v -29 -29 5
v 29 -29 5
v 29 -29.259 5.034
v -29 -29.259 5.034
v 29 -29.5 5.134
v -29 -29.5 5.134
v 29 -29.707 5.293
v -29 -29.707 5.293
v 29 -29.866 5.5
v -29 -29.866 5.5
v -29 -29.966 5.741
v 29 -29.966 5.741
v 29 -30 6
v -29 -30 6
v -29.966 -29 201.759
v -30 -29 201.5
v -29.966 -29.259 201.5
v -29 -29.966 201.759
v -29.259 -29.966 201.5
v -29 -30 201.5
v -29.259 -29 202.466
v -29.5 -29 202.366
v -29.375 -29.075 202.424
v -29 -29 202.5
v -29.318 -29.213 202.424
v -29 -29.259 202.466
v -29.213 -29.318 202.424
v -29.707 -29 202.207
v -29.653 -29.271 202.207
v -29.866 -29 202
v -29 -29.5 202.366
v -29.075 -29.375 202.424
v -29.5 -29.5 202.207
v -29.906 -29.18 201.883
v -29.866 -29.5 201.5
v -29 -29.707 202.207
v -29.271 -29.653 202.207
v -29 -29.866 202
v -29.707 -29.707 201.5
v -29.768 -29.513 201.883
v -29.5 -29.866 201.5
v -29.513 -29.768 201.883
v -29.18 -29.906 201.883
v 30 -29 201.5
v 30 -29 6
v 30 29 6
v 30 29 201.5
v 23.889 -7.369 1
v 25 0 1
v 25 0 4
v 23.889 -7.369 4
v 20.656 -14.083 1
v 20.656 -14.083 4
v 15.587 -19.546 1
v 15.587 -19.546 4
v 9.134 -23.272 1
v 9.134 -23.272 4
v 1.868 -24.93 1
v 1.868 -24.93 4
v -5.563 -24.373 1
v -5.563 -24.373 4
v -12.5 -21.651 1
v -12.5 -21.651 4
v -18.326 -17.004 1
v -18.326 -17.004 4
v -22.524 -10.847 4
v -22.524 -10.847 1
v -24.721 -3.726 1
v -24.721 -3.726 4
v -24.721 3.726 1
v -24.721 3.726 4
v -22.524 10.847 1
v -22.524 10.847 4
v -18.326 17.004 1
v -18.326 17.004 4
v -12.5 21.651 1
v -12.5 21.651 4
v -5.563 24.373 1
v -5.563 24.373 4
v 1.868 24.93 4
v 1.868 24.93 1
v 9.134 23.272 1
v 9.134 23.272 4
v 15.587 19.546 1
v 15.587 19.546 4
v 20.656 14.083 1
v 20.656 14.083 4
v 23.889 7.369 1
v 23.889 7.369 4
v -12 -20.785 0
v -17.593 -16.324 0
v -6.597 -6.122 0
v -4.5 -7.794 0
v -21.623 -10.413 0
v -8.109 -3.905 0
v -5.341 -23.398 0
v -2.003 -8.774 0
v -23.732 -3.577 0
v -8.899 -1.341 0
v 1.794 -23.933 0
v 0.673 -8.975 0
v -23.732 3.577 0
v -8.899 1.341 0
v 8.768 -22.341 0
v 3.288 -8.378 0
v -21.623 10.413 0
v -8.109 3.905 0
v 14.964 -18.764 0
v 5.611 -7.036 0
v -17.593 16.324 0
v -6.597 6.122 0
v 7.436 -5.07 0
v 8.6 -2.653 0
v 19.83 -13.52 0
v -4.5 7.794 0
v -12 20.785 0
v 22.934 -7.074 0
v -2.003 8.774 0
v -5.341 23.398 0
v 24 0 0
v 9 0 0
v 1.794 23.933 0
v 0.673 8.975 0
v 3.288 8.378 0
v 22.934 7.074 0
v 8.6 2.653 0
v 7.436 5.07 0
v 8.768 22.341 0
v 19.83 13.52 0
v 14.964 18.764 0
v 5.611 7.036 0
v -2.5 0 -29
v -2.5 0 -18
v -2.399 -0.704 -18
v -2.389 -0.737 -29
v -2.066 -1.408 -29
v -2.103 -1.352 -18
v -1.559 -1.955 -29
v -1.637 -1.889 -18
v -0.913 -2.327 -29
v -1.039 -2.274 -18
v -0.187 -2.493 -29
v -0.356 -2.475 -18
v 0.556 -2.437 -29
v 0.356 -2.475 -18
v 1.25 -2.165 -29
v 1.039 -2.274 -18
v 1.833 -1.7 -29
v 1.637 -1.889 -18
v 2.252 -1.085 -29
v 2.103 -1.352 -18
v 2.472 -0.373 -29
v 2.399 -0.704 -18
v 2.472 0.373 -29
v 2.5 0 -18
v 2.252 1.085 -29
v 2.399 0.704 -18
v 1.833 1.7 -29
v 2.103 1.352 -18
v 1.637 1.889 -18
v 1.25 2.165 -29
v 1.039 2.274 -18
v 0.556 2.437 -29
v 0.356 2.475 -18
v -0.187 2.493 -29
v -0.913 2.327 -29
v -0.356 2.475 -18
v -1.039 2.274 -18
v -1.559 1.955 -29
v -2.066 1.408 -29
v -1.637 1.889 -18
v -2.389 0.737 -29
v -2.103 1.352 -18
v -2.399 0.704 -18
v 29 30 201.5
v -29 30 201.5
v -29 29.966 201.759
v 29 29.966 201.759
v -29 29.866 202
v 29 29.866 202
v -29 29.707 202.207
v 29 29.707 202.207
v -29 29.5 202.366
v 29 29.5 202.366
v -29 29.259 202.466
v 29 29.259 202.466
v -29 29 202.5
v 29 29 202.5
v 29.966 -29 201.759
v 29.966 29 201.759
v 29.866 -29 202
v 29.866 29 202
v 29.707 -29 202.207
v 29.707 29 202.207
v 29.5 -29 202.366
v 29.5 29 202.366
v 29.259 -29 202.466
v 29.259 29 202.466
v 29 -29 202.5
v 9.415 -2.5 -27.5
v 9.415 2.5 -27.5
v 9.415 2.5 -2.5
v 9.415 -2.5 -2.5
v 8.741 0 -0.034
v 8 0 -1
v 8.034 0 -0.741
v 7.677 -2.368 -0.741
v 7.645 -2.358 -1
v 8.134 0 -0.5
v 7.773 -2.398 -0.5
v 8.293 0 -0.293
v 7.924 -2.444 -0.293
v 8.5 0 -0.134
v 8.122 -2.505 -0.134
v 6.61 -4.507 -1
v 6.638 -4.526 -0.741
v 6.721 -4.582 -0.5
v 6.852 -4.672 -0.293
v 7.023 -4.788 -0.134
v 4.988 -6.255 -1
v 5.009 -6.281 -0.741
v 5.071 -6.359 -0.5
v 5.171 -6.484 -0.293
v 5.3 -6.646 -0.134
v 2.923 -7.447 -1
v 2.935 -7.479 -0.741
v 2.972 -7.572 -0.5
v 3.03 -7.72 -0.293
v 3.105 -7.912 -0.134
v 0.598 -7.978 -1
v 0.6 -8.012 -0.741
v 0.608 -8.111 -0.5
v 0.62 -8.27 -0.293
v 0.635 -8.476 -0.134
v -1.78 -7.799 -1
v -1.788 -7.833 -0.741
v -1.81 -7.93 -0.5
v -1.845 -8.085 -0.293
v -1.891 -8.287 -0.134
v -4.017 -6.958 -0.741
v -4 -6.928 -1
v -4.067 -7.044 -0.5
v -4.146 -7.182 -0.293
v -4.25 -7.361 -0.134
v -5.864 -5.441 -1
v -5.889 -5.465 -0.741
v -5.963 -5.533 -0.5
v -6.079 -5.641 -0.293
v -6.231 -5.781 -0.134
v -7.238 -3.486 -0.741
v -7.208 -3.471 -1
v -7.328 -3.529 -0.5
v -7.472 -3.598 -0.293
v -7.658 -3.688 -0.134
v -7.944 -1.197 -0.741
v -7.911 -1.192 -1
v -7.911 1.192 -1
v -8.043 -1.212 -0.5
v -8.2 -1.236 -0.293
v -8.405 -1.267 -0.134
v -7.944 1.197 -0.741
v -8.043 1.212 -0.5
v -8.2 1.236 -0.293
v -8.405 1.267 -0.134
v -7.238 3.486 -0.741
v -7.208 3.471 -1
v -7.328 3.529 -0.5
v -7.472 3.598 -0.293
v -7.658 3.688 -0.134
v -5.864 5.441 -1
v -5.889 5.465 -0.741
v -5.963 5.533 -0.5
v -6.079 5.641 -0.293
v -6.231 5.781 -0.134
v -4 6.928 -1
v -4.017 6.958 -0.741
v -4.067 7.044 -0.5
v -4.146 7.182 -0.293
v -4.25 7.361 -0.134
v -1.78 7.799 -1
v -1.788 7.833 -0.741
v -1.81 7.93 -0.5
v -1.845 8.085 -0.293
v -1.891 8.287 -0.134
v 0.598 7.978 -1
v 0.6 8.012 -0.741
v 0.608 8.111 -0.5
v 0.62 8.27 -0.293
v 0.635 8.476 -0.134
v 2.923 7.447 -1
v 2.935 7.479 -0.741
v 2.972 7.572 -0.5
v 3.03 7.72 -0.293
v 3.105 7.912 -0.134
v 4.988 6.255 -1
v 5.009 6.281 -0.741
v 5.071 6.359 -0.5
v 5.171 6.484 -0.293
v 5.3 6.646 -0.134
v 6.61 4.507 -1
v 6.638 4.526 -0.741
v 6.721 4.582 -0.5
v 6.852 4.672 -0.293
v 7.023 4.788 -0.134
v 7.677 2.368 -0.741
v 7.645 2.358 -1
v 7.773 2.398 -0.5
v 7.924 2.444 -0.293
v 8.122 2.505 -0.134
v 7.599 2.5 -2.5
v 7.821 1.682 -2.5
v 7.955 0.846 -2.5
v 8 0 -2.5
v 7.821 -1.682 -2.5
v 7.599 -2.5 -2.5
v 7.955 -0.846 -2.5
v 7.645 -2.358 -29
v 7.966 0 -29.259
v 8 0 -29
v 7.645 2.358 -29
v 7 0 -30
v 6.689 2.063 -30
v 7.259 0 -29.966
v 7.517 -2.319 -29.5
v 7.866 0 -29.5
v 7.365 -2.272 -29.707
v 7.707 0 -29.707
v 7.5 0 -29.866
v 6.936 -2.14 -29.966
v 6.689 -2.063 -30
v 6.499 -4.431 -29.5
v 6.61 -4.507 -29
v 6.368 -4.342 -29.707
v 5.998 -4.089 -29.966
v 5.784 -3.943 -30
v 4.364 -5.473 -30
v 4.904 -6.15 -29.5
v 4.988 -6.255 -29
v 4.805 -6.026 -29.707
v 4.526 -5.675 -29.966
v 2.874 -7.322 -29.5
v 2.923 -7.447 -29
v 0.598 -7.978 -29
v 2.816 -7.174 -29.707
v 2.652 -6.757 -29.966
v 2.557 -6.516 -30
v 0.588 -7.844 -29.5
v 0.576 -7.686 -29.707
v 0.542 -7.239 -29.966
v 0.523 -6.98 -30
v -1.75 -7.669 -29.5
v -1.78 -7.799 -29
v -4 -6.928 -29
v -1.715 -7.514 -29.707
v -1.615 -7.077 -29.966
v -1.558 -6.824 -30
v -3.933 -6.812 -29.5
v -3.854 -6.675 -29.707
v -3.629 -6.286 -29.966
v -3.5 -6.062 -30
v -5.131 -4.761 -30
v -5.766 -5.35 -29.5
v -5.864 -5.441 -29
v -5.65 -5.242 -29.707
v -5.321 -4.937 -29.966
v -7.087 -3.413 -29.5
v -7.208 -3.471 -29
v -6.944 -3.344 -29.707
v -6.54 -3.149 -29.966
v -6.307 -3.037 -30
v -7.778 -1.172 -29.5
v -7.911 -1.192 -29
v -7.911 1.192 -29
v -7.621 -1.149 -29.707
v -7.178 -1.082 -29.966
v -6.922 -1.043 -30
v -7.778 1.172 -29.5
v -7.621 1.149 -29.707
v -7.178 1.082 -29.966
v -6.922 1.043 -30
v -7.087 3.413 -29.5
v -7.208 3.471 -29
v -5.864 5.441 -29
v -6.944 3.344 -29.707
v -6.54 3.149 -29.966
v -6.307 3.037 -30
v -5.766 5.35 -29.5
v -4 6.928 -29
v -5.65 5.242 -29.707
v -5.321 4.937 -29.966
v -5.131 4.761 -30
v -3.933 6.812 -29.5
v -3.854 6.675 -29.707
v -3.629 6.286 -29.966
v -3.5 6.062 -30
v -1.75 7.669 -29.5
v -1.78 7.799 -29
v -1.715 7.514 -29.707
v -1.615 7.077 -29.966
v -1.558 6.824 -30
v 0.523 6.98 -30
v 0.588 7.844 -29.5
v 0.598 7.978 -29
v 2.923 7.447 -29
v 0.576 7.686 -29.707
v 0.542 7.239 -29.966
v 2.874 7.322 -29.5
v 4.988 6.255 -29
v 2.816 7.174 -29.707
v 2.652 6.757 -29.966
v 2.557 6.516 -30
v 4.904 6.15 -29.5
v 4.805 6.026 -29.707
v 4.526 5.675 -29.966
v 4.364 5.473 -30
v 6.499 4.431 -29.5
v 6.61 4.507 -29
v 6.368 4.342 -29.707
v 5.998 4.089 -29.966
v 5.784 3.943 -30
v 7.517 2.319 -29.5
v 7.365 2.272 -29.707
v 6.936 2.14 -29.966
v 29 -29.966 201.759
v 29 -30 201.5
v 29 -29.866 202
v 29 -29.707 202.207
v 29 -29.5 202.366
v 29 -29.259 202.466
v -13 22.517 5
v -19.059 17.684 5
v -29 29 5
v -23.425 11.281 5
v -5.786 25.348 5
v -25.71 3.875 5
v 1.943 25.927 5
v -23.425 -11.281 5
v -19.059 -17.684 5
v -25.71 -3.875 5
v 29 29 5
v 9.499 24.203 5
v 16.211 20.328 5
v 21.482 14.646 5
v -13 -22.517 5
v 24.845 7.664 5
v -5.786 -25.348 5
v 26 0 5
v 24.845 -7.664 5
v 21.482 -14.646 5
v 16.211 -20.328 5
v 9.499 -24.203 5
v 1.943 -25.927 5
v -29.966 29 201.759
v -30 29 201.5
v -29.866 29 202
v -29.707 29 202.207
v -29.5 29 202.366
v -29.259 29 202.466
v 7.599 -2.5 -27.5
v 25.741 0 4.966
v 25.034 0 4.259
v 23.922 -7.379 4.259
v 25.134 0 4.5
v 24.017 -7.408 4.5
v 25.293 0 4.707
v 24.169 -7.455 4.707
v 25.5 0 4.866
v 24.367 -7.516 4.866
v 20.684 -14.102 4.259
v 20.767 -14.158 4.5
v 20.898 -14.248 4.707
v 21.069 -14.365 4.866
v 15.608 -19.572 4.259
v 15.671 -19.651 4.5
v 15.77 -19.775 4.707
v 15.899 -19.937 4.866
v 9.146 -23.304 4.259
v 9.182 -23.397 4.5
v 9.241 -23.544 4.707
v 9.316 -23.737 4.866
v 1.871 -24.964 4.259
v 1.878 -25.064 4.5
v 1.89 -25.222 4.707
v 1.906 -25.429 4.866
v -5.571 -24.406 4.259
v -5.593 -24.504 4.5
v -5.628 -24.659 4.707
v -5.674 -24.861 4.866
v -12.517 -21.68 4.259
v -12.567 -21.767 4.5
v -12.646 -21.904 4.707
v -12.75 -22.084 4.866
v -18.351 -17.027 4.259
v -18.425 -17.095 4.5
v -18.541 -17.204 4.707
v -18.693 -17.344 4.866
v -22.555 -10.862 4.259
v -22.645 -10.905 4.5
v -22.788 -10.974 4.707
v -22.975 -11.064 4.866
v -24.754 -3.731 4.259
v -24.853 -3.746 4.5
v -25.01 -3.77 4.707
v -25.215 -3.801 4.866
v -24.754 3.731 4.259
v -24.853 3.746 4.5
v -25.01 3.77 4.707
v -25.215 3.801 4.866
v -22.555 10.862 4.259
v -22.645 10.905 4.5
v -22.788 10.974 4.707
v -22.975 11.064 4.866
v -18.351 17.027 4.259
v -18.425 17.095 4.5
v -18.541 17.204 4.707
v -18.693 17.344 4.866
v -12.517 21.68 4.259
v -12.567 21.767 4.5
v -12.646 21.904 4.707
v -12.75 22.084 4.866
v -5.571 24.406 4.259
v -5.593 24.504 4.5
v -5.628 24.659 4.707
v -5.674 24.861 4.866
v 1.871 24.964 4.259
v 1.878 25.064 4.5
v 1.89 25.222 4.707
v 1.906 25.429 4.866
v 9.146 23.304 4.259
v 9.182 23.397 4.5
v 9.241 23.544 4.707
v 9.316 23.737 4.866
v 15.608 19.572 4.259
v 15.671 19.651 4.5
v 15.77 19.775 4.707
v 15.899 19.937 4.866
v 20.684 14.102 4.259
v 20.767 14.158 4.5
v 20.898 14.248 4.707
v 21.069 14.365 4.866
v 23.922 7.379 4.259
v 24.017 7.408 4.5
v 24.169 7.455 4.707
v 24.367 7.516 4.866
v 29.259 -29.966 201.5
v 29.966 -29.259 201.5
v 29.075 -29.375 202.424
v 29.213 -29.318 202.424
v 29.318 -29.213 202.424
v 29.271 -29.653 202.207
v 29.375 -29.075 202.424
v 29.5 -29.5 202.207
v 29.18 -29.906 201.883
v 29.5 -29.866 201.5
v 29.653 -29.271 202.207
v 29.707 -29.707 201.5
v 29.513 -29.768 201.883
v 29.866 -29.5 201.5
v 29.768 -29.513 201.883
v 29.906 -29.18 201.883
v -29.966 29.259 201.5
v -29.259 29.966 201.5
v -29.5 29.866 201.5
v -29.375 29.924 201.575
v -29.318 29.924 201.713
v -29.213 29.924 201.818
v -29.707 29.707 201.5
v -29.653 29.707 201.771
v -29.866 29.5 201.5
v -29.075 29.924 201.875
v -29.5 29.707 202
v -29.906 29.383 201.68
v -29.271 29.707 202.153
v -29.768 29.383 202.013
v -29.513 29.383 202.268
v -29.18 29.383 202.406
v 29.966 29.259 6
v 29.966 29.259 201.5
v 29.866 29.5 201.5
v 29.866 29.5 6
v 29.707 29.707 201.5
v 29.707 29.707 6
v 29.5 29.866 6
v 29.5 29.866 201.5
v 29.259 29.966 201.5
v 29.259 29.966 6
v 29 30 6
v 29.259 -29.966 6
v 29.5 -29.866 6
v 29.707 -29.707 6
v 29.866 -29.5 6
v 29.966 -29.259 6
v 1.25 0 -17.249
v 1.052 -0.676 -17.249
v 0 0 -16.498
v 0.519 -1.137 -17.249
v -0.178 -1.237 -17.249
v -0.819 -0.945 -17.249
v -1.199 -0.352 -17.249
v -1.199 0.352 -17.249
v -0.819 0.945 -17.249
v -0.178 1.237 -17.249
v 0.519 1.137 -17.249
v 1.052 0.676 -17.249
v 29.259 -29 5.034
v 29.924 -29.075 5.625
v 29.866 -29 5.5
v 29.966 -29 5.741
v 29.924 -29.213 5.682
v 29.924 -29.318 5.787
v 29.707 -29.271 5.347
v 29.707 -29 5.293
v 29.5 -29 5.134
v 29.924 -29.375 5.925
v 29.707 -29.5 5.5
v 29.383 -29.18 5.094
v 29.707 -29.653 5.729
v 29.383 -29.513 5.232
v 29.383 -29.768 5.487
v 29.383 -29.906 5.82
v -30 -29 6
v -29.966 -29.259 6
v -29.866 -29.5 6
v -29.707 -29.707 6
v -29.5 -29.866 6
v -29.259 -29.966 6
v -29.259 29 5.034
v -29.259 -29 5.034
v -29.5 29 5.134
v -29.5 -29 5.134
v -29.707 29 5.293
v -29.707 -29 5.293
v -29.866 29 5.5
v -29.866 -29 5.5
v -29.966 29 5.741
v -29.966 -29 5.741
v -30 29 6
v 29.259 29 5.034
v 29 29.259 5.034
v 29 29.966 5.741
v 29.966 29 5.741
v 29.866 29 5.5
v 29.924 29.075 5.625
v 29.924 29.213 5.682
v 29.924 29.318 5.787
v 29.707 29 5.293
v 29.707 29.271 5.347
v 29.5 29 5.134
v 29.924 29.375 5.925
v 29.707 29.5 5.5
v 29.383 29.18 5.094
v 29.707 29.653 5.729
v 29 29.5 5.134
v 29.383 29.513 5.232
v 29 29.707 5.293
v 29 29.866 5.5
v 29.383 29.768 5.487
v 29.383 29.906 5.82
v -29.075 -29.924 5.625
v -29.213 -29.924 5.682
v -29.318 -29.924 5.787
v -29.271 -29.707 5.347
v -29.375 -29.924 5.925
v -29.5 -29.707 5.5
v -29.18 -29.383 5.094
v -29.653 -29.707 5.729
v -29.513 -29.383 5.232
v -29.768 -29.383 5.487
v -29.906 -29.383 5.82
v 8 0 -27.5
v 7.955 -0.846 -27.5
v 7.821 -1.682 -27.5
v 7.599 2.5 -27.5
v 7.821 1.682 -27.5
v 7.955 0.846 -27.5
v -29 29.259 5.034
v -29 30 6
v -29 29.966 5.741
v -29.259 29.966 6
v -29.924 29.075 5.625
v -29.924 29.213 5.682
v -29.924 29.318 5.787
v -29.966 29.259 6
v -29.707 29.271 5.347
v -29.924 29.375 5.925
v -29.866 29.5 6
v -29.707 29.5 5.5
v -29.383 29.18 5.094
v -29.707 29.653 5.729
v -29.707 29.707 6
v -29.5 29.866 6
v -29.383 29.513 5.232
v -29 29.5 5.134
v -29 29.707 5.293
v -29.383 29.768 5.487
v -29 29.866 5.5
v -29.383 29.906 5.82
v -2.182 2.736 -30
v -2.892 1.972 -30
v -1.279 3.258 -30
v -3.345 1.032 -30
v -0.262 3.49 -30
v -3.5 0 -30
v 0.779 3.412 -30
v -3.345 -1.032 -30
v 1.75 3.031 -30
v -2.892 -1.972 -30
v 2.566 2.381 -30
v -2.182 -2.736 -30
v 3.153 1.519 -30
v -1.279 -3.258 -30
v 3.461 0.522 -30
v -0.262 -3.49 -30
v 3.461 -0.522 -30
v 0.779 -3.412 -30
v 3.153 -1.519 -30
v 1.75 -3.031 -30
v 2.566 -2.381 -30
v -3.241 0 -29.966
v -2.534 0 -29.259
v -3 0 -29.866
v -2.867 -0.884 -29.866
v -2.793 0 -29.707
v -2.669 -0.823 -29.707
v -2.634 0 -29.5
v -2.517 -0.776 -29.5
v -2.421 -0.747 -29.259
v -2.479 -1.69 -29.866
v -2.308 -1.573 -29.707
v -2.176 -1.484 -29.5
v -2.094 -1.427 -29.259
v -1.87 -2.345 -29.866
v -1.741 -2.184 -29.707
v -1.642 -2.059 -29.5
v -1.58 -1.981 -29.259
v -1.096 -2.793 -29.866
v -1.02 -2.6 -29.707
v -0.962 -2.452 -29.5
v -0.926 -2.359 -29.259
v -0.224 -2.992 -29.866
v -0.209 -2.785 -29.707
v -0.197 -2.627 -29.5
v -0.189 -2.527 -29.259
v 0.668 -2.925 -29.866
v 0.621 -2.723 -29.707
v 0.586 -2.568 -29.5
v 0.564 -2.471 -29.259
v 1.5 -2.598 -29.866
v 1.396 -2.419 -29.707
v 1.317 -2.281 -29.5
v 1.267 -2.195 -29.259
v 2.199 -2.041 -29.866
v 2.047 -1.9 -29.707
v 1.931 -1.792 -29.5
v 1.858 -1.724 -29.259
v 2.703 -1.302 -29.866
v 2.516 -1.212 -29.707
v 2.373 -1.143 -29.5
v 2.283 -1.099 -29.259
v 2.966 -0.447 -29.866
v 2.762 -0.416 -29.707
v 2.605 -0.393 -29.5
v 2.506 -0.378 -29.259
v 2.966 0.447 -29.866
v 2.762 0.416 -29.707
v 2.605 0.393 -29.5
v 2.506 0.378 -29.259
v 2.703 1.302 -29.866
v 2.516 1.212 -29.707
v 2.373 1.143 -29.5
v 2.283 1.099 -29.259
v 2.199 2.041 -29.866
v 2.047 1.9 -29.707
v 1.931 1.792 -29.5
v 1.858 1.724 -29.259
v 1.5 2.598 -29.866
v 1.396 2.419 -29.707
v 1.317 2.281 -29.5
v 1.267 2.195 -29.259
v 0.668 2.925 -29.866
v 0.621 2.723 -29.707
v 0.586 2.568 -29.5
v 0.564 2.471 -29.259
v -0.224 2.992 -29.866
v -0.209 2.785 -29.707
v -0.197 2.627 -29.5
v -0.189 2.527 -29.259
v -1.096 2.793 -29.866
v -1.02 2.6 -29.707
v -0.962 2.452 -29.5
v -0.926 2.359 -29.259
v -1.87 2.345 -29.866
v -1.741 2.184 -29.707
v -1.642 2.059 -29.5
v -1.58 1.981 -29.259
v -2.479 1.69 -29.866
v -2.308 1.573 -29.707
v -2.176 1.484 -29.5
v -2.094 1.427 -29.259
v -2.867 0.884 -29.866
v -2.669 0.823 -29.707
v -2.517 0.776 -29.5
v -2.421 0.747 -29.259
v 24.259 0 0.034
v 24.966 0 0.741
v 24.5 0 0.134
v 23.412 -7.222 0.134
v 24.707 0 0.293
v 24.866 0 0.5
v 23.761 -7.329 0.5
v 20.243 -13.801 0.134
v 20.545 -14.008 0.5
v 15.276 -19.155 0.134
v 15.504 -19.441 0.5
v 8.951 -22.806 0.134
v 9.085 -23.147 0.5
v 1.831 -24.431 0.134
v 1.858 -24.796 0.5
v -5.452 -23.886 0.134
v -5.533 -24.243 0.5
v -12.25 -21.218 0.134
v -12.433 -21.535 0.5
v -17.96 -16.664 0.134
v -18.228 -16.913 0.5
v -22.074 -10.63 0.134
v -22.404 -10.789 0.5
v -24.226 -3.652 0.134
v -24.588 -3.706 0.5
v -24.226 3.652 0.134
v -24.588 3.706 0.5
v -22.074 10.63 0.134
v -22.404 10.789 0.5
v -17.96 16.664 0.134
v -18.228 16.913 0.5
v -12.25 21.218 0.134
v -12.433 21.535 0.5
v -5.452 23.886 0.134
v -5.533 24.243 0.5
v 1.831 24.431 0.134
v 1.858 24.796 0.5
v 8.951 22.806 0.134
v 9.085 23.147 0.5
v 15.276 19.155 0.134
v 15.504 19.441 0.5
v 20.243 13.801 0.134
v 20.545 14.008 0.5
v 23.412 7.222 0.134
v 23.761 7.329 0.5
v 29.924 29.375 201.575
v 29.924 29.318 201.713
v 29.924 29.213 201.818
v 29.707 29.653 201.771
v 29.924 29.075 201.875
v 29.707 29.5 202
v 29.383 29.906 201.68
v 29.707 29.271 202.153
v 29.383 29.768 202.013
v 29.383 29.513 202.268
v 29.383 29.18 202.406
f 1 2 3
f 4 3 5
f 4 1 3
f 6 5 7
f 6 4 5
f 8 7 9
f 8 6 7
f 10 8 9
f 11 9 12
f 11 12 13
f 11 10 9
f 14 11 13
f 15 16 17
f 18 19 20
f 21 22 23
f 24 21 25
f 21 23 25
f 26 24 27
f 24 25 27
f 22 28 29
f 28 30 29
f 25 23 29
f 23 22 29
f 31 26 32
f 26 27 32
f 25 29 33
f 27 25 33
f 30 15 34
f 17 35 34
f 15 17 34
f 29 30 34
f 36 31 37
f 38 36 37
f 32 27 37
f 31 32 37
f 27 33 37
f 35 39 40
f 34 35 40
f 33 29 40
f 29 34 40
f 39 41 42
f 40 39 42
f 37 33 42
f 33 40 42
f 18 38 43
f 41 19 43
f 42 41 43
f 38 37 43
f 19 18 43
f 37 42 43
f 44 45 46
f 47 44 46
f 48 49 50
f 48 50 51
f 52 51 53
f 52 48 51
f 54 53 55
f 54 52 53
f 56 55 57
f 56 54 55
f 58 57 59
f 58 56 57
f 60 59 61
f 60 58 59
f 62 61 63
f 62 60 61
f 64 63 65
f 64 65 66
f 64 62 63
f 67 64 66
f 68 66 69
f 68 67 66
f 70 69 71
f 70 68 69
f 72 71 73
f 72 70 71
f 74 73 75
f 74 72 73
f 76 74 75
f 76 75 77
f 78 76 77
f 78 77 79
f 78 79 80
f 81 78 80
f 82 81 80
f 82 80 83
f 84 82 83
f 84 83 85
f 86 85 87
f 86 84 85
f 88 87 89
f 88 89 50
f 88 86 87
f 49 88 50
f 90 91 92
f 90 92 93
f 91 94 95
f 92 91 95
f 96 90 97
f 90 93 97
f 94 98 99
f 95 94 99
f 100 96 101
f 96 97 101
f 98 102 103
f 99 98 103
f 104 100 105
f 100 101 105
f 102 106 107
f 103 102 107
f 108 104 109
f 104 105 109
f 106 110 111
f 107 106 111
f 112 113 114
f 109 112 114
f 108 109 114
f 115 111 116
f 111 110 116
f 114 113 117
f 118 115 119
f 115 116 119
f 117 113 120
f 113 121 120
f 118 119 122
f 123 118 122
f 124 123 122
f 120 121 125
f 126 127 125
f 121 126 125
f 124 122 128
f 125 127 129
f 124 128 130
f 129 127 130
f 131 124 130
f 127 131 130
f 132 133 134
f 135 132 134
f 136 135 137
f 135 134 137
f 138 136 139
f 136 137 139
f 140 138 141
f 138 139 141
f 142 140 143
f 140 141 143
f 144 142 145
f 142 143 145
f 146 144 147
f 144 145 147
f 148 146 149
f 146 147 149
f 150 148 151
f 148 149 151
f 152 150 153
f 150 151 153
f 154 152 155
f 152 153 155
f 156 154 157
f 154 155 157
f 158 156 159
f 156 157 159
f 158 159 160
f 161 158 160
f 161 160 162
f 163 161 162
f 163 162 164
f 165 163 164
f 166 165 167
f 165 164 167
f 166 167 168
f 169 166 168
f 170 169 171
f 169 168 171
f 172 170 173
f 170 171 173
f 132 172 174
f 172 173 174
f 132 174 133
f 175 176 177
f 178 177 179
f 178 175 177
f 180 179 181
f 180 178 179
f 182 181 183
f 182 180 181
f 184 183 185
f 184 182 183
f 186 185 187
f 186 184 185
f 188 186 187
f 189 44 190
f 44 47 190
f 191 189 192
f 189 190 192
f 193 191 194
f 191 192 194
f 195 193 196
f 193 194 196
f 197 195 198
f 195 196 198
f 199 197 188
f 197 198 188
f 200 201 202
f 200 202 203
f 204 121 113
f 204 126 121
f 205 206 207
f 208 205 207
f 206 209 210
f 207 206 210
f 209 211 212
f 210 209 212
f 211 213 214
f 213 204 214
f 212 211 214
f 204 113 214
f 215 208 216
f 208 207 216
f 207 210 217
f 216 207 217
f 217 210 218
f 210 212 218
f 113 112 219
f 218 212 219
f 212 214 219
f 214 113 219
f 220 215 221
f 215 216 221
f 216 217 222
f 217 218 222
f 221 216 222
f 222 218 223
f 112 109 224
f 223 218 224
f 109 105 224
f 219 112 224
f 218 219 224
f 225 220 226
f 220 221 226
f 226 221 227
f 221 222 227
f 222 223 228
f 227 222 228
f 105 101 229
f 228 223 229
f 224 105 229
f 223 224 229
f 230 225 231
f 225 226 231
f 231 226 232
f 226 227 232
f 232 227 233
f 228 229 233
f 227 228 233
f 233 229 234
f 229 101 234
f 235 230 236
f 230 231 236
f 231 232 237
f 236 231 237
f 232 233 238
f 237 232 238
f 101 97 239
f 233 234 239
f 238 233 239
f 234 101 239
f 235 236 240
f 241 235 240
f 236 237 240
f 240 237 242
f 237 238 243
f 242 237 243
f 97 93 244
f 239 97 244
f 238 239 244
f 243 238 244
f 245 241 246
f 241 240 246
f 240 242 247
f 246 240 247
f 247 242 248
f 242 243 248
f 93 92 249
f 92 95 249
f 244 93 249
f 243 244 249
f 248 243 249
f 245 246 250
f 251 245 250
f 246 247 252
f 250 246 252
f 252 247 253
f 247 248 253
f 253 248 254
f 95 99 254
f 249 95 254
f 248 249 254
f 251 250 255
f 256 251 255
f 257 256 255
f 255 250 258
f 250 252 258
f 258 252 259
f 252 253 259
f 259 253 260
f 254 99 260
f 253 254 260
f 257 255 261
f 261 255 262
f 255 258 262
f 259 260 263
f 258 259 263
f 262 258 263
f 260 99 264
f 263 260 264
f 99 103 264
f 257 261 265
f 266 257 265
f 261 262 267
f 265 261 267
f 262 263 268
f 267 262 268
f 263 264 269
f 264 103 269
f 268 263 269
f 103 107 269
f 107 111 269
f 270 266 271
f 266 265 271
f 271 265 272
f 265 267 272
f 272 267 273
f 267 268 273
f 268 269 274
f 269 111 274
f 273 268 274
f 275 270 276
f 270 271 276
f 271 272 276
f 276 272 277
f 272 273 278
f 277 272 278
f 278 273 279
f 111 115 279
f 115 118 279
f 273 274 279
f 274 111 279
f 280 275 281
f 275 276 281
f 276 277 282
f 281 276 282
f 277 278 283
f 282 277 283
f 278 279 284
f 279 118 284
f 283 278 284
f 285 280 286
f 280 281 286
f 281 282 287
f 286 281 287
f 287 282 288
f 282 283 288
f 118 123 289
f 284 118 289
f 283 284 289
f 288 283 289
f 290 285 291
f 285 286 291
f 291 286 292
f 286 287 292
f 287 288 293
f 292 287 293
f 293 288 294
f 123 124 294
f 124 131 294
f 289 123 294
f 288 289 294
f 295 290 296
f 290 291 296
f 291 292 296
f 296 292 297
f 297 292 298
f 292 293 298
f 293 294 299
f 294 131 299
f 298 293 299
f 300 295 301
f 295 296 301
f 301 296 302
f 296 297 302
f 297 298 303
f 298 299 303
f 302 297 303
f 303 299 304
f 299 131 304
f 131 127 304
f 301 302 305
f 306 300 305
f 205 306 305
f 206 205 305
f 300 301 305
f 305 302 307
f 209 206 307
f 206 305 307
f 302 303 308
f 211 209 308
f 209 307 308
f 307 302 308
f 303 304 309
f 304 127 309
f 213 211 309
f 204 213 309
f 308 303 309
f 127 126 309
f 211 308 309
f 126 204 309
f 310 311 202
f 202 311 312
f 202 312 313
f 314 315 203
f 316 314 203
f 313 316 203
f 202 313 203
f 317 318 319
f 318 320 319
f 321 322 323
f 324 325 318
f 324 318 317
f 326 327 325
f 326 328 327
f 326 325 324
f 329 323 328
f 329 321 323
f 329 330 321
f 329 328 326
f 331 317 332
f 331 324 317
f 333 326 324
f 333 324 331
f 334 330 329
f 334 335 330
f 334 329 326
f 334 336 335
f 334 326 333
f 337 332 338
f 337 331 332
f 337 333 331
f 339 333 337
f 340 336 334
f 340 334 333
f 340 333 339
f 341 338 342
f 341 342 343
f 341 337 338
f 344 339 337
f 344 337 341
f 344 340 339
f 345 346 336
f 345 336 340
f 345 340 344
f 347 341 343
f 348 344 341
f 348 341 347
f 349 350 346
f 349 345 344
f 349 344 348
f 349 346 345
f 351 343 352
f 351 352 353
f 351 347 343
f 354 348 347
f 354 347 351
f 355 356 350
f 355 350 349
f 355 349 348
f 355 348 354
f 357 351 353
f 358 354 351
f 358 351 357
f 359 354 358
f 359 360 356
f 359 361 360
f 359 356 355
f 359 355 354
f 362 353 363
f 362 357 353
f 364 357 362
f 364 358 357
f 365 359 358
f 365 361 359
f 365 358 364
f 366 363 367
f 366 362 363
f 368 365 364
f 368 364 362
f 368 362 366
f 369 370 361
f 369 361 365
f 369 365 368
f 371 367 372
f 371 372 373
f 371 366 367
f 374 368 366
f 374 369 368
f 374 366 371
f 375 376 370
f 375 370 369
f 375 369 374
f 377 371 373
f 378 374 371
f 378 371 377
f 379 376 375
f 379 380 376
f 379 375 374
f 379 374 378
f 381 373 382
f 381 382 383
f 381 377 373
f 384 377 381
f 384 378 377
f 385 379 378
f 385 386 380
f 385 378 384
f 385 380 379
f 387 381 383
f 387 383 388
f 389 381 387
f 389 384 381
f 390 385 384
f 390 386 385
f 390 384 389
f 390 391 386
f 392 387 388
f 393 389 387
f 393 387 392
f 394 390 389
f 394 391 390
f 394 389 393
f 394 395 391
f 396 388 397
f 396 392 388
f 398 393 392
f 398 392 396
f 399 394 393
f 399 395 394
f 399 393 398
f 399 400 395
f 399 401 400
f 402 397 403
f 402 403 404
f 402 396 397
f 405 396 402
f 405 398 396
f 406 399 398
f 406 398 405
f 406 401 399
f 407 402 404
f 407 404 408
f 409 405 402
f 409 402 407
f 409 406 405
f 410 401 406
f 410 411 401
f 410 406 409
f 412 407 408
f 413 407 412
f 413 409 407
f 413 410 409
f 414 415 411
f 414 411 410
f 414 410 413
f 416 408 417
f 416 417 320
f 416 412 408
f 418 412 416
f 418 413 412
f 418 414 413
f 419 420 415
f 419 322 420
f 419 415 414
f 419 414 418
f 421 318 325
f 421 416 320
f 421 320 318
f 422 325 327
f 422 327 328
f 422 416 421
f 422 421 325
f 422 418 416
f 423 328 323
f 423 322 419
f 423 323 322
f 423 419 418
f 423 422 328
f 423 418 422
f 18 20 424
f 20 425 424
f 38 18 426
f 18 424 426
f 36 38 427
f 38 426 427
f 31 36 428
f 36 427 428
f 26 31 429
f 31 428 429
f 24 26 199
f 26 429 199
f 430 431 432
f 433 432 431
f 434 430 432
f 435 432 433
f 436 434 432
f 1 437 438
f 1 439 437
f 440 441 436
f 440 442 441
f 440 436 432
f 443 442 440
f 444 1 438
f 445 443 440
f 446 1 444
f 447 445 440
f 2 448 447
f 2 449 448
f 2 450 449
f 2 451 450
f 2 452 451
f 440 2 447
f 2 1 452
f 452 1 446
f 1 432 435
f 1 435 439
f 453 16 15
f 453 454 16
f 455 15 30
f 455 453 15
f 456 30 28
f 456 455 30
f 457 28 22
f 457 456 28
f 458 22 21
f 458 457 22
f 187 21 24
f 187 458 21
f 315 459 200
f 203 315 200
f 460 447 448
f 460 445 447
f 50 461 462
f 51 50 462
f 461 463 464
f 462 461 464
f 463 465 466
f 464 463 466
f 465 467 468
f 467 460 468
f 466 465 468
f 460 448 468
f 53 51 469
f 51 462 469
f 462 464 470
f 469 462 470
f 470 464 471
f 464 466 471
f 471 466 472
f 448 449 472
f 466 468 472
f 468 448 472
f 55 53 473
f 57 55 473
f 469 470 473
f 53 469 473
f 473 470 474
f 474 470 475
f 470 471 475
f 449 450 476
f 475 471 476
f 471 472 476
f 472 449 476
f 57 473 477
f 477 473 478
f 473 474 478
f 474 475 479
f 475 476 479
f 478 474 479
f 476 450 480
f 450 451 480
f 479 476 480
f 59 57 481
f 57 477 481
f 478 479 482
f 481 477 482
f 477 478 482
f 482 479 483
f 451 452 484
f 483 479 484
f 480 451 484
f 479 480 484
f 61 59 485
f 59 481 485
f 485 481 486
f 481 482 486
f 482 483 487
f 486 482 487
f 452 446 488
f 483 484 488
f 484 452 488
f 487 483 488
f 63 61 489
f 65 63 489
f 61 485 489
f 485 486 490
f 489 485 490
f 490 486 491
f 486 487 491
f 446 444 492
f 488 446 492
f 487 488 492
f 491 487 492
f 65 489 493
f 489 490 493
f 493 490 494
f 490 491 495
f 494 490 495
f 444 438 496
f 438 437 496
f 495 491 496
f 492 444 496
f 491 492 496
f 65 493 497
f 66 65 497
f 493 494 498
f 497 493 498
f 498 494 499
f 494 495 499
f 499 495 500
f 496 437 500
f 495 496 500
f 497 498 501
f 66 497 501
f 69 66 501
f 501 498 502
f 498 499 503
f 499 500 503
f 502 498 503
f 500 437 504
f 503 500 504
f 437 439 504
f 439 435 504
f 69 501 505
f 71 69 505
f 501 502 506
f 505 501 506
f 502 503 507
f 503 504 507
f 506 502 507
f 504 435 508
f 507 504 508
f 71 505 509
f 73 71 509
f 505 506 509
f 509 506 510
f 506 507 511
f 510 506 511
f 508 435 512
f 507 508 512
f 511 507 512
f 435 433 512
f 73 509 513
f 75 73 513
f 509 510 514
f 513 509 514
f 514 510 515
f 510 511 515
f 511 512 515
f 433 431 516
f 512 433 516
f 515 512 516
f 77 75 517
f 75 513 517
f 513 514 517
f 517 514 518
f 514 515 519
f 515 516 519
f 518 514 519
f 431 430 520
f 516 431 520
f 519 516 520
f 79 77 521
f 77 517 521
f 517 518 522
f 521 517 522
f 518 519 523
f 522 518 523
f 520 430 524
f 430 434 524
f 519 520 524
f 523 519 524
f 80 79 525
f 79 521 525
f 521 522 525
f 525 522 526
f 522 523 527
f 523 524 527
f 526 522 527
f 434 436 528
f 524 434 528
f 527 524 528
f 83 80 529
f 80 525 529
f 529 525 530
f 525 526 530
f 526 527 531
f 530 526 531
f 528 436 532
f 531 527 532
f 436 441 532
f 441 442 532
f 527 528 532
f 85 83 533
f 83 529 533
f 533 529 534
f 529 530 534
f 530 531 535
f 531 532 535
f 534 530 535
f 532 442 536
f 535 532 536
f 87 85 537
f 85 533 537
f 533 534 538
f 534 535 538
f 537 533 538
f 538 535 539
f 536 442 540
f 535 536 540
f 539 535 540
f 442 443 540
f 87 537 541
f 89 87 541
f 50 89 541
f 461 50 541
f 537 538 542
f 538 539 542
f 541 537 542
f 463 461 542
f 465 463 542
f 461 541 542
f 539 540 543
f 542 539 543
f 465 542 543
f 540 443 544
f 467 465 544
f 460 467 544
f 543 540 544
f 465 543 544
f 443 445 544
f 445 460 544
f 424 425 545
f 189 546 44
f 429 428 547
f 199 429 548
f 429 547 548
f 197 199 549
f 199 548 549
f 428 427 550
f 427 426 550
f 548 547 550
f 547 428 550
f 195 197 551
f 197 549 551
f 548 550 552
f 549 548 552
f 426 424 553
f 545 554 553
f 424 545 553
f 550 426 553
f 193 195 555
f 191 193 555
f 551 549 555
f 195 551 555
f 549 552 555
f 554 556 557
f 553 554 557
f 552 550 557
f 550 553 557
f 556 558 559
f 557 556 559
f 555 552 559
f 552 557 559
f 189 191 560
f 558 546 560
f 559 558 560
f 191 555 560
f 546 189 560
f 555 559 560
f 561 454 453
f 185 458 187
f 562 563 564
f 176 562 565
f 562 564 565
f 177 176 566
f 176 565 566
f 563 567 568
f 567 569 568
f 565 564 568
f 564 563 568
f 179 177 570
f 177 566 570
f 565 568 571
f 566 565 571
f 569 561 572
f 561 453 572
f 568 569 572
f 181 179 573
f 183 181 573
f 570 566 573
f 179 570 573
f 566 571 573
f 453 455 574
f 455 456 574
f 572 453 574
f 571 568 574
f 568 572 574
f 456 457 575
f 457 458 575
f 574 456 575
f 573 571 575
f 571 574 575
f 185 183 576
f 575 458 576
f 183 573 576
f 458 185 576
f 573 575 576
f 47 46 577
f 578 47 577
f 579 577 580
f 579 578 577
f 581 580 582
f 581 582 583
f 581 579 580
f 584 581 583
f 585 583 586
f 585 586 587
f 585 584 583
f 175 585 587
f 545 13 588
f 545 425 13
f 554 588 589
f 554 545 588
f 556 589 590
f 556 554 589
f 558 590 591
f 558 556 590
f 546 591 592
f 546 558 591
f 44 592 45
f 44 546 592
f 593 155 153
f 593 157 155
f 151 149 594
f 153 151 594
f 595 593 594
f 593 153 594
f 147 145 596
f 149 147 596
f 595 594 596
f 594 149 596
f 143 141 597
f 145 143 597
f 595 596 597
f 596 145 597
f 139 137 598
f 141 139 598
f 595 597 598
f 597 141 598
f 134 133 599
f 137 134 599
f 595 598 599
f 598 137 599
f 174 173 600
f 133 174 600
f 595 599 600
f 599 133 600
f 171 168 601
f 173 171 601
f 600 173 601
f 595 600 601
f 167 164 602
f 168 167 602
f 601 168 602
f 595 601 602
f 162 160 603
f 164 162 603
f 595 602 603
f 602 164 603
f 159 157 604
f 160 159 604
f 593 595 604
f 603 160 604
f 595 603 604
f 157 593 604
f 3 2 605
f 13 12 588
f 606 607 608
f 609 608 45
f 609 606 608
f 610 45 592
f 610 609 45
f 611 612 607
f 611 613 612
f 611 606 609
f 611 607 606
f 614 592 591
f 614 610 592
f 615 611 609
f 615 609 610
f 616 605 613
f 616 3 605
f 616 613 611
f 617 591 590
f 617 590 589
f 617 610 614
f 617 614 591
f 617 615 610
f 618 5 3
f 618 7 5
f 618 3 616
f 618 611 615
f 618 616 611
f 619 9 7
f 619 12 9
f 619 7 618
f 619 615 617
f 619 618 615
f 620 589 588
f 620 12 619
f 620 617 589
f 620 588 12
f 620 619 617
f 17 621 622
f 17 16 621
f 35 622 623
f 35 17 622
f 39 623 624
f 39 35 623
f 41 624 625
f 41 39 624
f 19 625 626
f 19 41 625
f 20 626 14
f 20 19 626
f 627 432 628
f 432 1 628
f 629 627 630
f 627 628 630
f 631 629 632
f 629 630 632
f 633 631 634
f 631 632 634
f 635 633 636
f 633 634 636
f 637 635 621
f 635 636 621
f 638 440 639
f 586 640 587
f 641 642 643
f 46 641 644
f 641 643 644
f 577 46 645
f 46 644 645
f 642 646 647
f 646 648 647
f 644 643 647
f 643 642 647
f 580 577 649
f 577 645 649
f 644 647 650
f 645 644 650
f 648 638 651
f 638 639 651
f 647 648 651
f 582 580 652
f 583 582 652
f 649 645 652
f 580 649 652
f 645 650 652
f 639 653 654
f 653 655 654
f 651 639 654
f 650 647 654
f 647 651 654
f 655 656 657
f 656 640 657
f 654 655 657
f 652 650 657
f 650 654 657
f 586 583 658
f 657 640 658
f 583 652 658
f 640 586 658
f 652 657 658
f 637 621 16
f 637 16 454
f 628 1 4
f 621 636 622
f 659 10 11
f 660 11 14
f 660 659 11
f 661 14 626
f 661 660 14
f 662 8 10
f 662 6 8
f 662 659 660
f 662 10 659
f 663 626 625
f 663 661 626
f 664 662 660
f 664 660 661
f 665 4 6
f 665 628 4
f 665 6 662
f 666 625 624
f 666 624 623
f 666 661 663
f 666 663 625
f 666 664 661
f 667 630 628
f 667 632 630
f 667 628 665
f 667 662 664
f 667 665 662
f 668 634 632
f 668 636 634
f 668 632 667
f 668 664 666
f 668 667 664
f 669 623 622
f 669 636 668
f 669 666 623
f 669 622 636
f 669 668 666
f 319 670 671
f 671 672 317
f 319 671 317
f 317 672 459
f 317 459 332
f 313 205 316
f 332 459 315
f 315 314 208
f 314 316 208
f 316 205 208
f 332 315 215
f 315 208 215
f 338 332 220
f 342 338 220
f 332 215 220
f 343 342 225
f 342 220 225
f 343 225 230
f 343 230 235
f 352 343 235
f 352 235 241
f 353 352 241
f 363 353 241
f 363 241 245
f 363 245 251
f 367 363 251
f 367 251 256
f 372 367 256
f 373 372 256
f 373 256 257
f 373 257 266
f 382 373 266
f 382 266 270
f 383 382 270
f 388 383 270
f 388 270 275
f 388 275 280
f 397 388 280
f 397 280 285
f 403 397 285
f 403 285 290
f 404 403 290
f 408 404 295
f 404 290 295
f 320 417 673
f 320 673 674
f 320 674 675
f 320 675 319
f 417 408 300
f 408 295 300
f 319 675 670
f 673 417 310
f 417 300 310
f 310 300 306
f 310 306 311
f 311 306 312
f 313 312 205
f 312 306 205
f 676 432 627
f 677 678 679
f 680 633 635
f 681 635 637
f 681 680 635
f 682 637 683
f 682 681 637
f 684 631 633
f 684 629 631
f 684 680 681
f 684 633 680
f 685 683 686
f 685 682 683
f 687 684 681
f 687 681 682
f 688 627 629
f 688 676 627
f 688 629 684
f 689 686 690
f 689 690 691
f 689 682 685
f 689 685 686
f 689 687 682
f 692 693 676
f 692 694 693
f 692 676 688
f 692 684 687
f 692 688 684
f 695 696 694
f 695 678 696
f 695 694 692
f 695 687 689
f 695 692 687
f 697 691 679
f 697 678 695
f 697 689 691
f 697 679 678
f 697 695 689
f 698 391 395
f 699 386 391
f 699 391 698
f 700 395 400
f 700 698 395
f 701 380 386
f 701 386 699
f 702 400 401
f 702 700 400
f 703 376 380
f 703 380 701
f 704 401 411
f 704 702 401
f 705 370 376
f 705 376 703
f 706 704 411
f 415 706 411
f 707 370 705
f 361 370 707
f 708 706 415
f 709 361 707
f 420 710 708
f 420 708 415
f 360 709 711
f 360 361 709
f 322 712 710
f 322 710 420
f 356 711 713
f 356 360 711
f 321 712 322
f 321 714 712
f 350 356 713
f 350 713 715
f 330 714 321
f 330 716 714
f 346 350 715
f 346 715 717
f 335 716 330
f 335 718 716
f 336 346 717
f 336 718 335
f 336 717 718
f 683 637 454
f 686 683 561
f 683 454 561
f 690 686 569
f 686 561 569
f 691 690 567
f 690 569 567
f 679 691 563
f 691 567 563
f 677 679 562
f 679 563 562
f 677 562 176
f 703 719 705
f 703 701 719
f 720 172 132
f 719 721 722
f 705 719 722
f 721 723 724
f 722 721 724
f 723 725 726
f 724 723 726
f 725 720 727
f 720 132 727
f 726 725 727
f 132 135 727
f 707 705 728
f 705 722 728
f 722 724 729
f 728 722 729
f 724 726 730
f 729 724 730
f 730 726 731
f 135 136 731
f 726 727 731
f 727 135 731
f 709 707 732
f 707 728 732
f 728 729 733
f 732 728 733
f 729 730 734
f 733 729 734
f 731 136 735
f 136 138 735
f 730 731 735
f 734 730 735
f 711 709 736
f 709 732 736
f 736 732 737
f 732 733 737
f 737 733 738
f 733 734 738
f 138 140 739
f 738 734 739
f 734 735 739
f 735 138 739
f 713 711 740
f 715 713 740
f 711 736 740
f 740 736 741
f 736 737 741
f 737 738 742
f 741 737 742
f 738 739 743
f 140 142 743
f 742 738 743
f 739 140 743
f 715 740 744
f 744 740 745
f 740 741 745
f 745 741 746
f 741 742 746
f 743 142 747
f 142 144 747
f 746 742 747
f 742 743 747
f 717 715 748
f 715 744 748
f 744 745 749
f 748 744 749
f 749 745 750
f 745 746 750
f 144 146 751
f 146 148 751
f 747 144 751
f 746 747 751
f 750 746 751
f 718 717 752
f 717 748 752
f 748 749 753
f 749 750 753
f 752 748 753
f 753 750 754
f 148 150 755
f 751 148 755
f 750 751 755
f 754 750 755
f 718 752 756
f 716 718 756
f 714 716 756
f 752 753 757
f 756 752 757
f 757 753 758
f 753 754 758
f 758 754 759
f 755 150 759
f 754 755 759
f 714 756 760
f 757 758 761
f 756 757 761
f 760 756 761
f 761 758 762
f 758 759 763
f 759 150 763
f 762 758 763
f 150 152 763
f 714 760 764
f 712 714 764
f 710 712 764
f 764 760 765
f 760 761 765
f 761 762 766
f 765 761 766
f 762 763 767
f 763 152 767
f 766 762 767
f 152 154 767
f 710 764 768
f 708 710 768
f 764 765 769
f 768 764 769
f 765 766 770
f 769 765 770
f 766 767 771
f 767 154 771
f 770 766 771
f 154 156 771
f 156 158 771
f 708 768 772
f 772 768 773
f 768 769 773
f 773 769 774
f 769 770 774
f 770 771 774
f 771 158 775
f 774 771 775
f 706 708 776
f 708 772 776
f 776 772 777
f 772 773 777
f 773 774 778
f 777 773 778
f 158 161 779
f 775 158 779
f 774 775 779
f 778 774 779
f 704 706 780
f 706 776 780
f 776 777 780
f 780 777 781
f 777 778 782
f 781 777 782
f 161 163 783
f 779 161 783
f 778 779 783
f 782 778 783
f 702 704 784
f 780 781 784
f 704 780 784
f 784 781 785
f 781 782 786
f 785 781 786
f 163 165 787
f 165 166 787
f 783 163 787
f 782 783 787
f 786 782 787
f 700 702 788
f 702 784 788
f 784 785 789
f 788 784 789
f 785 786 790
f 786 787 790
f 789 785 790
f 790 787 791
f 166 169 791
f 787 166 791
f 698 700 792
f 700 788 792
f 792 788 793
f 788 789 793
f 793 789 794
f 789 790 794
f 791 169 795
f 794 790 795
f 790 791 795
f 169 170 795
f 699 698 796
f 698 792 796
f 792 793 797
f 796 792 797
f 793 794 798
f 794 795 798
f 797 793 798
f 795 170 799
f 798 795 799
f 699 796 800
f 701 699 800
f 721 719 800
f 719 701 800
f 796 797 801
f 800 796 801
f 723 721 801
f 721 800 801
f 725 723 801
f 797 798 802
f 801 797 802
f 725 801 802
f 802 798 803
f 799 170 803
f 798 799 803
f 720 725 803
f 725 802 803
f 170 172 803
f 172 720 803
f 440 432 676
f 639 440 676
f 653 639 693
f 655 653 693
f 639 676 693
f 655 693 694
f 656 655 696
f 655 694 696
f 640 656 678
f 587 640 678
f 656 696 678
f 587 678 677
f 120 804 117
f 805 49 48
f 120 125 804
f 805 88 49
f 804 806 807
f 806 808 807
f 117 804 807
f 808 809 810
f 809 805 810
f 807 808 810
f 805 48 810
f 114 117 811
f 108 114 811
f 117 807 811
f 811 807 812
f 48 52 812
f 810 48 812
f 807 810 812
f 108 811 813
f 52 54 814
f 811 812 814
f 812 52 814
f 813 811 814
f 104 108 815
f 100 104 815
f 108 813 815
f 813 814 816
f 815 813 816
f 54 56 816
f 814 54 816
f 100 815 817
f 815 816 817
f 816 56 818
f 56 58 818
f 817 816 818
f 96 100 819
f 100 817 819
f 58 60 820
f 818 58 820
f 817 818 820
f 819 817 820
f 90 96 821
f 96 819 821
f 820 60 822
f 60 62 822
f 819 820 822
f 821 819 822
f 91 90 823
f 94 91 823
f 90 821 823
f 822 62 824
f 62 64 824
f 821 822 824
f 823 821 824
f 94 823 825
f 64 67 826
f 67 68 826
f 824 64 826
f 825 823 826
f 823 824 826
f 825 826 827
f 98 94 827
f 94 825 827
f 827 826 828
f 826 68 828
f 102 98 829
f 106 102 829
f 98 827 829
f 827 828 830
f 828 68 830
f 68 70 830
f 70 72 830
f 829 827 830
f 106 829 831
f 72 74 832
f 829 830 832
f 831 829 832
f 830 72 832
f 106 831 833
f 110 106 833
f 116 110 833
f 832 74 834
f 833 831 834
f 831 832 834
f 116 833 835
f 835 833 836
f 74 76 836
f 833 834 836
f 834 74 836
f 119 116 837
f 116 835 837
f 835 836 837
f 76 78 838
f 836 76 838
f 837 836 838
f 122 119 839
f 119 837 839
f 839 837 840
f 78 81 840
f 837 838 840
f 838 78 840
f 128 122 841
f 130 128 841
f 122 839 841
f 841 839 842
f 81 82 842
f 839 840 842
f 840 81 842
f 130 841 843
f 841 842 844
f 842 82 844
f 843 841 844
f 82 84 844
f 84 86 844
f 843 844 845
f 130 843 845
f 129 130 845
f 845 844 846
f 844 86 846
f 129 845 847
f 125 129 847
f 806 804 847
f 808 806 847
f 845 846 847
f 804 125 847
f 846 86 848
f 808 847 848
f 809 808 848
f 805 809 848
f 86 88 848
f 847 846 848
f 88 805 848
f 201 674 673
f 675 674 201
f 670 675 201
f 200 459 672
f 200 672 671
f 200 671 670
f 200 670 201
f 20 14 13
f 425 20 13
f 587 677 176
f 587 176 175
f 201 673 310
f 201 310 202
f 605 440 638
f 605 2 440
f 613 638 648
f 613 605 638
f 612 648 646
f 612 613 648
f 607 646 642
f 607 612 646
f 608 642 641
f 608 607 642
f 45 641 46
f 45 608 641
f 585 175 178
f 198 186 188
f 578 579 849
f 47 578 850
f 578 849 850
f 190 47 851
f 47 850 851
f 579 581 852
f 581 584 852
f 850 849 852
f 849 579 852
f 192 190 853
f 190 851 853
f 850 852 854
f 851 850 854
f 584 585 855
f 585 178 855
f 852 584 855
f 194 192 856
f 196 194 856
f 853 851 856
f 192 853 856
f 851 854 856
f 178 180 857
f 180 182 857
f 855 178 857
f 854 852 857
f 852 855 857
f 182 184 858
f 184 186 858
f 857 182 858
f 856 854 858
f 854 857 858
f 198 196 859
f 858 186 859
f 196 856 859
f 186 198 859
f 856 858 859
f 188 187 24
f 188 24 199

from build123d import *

# Parameters (mm, degrees)
F0_W      = 60
F0_H      = 60
F1_DEPTH  = 202.5
F2_R      = 8
F3_DEPTH  = 30
F5_D      = 5
F5_DEPTH  = 12
F5_TIP    = 1.5021515476
F7_W      = 3
F7_H      = 5
F8_DEPTH  = 25
F9_W      = 66.6528567672
F9_H      = 63.3320808411
F9_W_2    = 60
F9_H_2    = 60
F9_R      = 25
F10_DEPTH = 5
F11_R     = 1


with BuildPart() as f1:
    # F0 (on Top) → F1 (new body)
    with BuildSketch(Plane.XY):
        Rectangle(F0_W, F0_H)
    extrude(amount=F1_DEPTH)

    # F2 (on face) → F3 (join)
    with BuildSketch(Plane(origin=(0, 0, 0), x_dir=(1, 0, 0), z_dir=(0, 0, -1))):
        Circle(F2_R)
    extrude(amount=F3_DEPTH)

    # F5
    with Locations(Plane(origin=(0, 0, -30), x_dir=(1, 0, 0), z_dir=(0, 0, -1))):
        with Locations((0, 0)):
            Hole(F5_D / 2, depth=F5_DEPTH)
            with Locations((0, 0, -(F5_DEPTH + F5_TIP / 2))):  # 118° drill point
                Cone(0, F5_D / 2, F5_TIP, mode=Mode.SUBTRACT)

    # F7 (on offset) → F8 (join)
    with BuildSketch(Plane(origin=(0, 0, -27.5), x_dir=(1, 0, 0), z_dir=(0, 0, -1))):
        with Locations((7.9153832048, 0)):
            Rectangle(F7_W, F7_H)
    extrude(amount=-F8_DEPTH)

    # F9 (on face) → F10 (cut)
    with BuildSketch(Plane(origin=(0, 0, 0), x_dir=(1, 0, 0), z_dir=(0, 0, -1))):
        Rectangle(F9_W, F9_H)
        Rectangle(F9_W_2, F9_H_2, mode=Mode.SUBTRACT)
        Rectangle(F9_W_2, F9_H_2)
        Circle(F9_R, mode=Mode.SUBTRACT)
    extrude(amount=-F10_DEPTH, mode=Mode.SUBTRACT)

    # F11
    f11_edges = [f1.edges().sort_by_distance(p)[0] for p in [
        (0, 30, 5),
        (-30, 0, 5),
        (0, -30, 5),
        (30, 0, 5),
        (-25, 0, 5),
        (-25, 0, 0),
        (-8, 0, 0),
        (-8, 0, -30),
        (-2.5, 0, -30),
        (-30, -30, 103.75),
        (-30, 0, 202.5),
        (-30, 30, 103.75),
        (30, -30, 103.75),
        (0, -30, 202.5),
        (0, 30, 202.5),
        (30, 30, 103.75),
        (30, 0, 202.5),
    ]]
    fillet(f11_edges, radius=F11_R)


solid = f1.part
